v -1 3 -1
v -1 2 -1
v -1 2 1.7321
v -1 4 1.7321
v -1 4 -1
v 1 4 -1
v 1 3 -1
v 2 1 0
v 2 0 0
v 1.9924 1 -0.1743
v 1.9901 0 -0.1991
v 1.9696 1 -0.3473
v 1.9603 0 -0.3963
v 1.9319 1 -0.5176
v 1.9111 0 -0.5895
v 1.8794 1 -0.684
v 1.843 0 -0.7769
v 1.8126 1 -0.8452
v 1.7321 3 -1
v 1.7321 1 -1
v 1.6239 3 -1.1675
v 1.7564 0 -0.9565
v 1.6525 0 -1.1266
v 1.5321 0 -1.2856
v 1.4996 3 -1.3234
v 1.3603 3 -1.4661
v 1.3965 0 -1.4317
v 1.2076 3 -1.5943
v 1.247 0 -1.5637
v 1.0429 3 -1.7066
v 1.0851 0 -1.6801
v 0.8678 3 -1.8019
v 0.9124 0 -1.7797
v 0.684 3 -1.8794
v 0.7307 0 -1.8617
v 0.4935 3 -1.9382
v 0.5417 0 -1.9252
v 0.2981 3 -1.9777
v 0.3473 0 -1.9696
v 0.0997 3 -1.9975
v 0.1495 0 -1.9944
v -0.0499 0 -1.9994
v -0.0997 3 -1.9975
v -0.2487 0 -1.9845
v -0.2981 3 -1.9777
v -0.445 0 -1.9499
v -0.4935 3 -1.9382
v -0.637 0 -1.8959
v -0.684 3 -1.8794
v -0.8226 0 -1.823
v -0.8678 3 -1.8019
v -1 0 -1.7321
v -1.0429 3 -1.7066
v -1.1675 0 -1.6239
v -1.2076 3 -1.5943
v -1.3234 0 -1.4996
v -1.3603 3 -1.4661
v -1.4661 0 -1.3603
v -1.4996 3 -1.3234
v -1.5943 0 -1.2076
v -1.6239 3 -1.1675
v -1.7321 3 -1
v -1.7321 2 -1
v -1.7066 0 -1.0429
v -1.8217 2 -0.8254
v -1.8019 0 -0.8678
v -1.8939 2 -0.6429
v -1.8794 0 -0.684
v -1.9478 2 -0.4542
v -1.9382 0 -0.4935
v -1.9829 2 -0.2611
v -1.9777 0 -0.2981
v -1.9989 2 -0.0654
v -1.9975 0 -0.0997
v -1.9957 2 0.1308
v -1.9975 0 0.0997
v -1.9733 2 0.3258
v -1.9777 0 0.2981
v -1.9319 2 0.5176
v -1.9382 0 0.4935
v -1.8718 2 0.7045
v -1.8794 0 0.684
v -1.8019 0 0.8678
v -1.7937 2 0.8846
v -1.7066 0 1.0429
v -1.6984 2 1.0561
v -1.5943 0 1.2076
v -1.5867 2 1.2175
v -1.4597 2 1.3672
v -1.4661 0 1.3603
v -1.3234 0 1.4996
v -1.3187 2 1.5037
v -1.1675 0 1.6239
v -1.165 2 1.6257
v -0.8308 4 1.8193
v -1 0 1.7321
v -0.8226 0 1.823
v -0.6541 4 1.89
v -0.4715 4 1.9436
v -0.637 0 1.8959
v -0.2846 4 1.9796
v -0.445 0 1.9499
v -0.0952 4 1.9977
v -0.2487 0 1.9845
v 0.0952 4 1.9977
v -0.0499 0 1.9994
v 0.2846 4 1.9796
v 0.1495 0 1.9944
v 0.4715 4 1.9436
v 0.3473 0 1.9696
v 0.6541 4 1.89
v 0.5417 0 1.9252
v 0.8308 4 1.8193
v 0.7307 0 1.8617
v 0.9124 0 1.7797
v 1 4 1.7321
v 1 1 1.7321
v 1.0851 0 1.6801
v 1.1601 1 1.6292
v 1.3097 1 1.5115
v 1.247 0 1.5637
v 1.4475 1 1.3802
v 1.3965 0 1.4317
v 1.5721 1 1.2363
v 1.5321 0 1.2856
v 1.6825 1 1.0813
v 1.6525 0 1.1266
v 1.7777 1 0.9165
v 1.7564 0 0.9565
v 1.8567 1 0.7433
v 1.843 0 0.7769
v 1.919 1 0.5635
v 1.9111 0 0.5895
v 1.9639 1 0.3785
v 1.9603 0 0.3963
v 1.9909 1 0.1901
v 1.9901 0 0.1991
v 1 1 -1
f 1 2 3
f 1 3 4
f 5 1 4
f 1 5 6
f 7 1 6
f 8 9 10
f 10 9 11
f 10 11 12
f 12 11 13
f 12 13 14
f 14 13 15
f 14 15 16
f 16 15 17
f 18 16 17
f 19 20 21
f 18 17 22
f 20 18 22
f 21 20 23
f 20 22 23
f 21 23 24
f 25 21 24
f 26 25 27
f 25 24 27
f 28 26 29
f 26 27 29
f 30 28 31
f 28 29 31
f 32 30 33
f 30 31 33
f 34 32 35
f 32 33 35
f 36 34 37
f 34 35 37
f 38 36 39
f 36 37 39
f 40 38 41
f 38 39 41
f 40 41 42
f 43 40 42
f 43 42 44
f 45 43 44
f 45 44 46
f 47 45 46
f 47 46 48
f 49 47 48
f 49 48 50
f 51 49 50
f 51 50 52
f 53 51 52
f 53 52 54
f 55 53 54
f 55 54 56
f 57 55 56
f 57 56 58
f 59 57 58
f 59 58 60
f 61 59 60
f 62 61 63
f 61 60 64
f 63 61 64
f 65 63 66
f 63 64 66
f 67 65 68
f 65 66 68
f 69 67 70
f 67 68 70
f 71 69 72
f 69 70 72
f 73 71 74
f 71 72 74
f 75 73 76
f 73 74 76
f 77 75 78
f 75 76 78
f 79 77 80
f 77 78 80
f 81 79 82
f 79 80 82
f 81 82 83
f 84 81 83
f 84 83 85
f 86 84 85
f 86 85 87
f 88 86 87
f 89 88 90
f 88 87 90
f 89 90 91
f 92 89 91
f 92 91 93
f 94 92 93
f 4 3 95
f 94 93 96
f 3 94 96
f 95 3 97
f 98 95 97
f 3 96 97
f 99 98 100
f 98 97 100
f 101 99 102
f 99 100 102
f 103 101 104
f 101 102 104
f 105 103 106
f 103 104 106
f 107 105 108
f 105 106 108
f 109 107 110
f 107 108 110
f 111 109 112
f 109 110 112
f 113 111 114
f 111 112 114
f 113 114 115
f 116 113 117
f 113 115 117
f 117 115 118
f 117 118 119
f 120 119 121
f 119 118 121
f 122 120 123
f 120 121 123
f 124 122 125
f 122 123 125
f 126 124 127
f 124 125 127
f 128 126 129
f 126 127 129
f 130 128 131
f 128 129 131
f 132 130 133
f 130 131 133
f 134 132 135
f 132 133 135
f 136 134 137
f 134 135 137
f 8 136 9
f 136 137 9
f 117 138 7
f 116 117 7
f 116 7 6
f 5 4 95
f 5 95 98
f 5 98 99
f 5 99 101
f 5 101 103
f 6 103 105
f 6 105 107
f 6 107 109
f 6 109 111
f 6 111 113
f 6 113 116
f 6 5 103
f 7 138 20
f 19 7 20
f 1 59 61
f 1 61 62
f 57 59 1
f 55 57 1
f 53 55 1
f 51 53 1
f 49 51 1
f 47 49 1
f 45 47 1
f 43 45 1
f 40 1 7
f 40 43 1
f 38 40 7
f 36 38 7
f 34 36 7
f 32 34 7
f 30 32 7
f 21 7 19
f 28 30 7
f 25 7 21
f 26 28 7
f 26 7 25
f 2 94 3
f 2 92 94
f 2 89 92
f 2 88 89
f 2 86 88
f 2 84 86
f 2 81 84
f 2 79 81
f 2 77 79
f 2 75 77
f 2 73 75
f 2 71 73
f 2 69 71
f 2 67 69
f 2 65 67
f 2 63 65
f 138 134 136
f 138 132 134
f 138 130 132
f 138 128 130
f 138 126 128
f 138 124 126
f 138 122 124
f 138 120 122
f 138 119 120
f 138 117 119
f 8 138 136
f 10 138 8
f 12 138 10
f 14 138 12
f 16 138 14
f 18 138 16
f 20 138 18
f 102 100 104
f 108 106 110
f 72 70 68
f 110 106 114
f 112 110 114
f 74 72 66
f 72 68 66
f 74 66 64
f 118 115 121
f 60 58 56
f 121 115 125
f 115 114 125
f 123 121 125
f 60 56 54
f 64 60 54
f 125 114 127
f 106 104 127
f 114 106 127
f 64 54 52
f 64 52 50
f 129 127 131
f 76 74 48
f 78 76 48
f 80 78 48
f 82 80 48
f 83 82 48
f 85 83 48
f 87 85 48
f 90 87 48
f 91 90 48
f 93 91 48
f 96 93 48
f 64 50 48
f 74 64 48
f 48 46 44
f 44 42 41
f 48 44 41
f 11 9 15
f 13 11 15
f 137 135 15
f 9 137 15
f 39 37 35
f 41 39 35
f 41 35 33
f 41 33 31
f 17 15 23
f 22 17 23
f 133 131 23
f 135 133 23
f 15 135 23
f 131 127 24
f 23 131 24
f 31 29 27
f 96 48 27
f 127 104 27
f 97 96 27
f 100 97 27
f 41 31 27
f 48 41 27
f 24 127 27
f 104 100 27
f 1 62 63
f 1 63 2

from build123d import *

# Parameters (mm, degrees)
SKETCH1_R               = 2
BOSS_EXTRUDE1_DEPTH     = 4
SKETCH2_W               = 1
SKETCH2_H               = 3
SKETCH2_H_2             = 2
CUT_EXTRUDE1_DEPTH      = 3
CUT_EXTRUDE1_DEPTH_BACK = 1
CUT_EXTRUDE2_DEPTH      = 1


with BuildPart() as part:
    # Sketch1 → Boss-Extrude1 (new body)
    with BuildSketch(Plane(origin=(0, 0, 0), x_dir=(1, 0, 0), z_dir=(0, 1, 0))):
        Circle(SKETCH1_R)
    extrude(amount=BOSS_EXTRUDE1_DEPTH)

    # Sketch2 → Cut-Extrude1 (cut, two sides)
    with BuildSketch(Plane.XY) as cut_extrude1_sk:
        with Locations((1.5, 2.5)):
            Rectangle(SKETCH2_W, SKETCH2_H)
        with Locations((-1.5, 3)):
            Rectangle(SKETCH2_W, SKETCH2_H_2)
    extrude(amount=CUT_EXTRUDE1_DEPTH, mode=Mode.SUBTRACT)
    extrude(cut_extrude1_sk.sketch, amount=-CUT_EXTRUDE1_DEPTH_BACK, mode=Mode.SUBTRACT)

    # Sketch3 → Cut-Extrude2 (cut)
    with BuildSketch(Plane(origin=(0, 4, 0), x_dir=(1, 0, 0), z_dir=(0, 1, 0))):
        with BuildLine():
            Line((-1.732050808, 1), (1.732050808, 1))
            ThreePointArc((1.732050808, 1), (0, 2), (-1.732050808, 1))
        make_face()
    extrude(amount=-CUT_EXTRUDE2_DEPTH, mode=Mode.SUBTRACT)


solid = part.part
